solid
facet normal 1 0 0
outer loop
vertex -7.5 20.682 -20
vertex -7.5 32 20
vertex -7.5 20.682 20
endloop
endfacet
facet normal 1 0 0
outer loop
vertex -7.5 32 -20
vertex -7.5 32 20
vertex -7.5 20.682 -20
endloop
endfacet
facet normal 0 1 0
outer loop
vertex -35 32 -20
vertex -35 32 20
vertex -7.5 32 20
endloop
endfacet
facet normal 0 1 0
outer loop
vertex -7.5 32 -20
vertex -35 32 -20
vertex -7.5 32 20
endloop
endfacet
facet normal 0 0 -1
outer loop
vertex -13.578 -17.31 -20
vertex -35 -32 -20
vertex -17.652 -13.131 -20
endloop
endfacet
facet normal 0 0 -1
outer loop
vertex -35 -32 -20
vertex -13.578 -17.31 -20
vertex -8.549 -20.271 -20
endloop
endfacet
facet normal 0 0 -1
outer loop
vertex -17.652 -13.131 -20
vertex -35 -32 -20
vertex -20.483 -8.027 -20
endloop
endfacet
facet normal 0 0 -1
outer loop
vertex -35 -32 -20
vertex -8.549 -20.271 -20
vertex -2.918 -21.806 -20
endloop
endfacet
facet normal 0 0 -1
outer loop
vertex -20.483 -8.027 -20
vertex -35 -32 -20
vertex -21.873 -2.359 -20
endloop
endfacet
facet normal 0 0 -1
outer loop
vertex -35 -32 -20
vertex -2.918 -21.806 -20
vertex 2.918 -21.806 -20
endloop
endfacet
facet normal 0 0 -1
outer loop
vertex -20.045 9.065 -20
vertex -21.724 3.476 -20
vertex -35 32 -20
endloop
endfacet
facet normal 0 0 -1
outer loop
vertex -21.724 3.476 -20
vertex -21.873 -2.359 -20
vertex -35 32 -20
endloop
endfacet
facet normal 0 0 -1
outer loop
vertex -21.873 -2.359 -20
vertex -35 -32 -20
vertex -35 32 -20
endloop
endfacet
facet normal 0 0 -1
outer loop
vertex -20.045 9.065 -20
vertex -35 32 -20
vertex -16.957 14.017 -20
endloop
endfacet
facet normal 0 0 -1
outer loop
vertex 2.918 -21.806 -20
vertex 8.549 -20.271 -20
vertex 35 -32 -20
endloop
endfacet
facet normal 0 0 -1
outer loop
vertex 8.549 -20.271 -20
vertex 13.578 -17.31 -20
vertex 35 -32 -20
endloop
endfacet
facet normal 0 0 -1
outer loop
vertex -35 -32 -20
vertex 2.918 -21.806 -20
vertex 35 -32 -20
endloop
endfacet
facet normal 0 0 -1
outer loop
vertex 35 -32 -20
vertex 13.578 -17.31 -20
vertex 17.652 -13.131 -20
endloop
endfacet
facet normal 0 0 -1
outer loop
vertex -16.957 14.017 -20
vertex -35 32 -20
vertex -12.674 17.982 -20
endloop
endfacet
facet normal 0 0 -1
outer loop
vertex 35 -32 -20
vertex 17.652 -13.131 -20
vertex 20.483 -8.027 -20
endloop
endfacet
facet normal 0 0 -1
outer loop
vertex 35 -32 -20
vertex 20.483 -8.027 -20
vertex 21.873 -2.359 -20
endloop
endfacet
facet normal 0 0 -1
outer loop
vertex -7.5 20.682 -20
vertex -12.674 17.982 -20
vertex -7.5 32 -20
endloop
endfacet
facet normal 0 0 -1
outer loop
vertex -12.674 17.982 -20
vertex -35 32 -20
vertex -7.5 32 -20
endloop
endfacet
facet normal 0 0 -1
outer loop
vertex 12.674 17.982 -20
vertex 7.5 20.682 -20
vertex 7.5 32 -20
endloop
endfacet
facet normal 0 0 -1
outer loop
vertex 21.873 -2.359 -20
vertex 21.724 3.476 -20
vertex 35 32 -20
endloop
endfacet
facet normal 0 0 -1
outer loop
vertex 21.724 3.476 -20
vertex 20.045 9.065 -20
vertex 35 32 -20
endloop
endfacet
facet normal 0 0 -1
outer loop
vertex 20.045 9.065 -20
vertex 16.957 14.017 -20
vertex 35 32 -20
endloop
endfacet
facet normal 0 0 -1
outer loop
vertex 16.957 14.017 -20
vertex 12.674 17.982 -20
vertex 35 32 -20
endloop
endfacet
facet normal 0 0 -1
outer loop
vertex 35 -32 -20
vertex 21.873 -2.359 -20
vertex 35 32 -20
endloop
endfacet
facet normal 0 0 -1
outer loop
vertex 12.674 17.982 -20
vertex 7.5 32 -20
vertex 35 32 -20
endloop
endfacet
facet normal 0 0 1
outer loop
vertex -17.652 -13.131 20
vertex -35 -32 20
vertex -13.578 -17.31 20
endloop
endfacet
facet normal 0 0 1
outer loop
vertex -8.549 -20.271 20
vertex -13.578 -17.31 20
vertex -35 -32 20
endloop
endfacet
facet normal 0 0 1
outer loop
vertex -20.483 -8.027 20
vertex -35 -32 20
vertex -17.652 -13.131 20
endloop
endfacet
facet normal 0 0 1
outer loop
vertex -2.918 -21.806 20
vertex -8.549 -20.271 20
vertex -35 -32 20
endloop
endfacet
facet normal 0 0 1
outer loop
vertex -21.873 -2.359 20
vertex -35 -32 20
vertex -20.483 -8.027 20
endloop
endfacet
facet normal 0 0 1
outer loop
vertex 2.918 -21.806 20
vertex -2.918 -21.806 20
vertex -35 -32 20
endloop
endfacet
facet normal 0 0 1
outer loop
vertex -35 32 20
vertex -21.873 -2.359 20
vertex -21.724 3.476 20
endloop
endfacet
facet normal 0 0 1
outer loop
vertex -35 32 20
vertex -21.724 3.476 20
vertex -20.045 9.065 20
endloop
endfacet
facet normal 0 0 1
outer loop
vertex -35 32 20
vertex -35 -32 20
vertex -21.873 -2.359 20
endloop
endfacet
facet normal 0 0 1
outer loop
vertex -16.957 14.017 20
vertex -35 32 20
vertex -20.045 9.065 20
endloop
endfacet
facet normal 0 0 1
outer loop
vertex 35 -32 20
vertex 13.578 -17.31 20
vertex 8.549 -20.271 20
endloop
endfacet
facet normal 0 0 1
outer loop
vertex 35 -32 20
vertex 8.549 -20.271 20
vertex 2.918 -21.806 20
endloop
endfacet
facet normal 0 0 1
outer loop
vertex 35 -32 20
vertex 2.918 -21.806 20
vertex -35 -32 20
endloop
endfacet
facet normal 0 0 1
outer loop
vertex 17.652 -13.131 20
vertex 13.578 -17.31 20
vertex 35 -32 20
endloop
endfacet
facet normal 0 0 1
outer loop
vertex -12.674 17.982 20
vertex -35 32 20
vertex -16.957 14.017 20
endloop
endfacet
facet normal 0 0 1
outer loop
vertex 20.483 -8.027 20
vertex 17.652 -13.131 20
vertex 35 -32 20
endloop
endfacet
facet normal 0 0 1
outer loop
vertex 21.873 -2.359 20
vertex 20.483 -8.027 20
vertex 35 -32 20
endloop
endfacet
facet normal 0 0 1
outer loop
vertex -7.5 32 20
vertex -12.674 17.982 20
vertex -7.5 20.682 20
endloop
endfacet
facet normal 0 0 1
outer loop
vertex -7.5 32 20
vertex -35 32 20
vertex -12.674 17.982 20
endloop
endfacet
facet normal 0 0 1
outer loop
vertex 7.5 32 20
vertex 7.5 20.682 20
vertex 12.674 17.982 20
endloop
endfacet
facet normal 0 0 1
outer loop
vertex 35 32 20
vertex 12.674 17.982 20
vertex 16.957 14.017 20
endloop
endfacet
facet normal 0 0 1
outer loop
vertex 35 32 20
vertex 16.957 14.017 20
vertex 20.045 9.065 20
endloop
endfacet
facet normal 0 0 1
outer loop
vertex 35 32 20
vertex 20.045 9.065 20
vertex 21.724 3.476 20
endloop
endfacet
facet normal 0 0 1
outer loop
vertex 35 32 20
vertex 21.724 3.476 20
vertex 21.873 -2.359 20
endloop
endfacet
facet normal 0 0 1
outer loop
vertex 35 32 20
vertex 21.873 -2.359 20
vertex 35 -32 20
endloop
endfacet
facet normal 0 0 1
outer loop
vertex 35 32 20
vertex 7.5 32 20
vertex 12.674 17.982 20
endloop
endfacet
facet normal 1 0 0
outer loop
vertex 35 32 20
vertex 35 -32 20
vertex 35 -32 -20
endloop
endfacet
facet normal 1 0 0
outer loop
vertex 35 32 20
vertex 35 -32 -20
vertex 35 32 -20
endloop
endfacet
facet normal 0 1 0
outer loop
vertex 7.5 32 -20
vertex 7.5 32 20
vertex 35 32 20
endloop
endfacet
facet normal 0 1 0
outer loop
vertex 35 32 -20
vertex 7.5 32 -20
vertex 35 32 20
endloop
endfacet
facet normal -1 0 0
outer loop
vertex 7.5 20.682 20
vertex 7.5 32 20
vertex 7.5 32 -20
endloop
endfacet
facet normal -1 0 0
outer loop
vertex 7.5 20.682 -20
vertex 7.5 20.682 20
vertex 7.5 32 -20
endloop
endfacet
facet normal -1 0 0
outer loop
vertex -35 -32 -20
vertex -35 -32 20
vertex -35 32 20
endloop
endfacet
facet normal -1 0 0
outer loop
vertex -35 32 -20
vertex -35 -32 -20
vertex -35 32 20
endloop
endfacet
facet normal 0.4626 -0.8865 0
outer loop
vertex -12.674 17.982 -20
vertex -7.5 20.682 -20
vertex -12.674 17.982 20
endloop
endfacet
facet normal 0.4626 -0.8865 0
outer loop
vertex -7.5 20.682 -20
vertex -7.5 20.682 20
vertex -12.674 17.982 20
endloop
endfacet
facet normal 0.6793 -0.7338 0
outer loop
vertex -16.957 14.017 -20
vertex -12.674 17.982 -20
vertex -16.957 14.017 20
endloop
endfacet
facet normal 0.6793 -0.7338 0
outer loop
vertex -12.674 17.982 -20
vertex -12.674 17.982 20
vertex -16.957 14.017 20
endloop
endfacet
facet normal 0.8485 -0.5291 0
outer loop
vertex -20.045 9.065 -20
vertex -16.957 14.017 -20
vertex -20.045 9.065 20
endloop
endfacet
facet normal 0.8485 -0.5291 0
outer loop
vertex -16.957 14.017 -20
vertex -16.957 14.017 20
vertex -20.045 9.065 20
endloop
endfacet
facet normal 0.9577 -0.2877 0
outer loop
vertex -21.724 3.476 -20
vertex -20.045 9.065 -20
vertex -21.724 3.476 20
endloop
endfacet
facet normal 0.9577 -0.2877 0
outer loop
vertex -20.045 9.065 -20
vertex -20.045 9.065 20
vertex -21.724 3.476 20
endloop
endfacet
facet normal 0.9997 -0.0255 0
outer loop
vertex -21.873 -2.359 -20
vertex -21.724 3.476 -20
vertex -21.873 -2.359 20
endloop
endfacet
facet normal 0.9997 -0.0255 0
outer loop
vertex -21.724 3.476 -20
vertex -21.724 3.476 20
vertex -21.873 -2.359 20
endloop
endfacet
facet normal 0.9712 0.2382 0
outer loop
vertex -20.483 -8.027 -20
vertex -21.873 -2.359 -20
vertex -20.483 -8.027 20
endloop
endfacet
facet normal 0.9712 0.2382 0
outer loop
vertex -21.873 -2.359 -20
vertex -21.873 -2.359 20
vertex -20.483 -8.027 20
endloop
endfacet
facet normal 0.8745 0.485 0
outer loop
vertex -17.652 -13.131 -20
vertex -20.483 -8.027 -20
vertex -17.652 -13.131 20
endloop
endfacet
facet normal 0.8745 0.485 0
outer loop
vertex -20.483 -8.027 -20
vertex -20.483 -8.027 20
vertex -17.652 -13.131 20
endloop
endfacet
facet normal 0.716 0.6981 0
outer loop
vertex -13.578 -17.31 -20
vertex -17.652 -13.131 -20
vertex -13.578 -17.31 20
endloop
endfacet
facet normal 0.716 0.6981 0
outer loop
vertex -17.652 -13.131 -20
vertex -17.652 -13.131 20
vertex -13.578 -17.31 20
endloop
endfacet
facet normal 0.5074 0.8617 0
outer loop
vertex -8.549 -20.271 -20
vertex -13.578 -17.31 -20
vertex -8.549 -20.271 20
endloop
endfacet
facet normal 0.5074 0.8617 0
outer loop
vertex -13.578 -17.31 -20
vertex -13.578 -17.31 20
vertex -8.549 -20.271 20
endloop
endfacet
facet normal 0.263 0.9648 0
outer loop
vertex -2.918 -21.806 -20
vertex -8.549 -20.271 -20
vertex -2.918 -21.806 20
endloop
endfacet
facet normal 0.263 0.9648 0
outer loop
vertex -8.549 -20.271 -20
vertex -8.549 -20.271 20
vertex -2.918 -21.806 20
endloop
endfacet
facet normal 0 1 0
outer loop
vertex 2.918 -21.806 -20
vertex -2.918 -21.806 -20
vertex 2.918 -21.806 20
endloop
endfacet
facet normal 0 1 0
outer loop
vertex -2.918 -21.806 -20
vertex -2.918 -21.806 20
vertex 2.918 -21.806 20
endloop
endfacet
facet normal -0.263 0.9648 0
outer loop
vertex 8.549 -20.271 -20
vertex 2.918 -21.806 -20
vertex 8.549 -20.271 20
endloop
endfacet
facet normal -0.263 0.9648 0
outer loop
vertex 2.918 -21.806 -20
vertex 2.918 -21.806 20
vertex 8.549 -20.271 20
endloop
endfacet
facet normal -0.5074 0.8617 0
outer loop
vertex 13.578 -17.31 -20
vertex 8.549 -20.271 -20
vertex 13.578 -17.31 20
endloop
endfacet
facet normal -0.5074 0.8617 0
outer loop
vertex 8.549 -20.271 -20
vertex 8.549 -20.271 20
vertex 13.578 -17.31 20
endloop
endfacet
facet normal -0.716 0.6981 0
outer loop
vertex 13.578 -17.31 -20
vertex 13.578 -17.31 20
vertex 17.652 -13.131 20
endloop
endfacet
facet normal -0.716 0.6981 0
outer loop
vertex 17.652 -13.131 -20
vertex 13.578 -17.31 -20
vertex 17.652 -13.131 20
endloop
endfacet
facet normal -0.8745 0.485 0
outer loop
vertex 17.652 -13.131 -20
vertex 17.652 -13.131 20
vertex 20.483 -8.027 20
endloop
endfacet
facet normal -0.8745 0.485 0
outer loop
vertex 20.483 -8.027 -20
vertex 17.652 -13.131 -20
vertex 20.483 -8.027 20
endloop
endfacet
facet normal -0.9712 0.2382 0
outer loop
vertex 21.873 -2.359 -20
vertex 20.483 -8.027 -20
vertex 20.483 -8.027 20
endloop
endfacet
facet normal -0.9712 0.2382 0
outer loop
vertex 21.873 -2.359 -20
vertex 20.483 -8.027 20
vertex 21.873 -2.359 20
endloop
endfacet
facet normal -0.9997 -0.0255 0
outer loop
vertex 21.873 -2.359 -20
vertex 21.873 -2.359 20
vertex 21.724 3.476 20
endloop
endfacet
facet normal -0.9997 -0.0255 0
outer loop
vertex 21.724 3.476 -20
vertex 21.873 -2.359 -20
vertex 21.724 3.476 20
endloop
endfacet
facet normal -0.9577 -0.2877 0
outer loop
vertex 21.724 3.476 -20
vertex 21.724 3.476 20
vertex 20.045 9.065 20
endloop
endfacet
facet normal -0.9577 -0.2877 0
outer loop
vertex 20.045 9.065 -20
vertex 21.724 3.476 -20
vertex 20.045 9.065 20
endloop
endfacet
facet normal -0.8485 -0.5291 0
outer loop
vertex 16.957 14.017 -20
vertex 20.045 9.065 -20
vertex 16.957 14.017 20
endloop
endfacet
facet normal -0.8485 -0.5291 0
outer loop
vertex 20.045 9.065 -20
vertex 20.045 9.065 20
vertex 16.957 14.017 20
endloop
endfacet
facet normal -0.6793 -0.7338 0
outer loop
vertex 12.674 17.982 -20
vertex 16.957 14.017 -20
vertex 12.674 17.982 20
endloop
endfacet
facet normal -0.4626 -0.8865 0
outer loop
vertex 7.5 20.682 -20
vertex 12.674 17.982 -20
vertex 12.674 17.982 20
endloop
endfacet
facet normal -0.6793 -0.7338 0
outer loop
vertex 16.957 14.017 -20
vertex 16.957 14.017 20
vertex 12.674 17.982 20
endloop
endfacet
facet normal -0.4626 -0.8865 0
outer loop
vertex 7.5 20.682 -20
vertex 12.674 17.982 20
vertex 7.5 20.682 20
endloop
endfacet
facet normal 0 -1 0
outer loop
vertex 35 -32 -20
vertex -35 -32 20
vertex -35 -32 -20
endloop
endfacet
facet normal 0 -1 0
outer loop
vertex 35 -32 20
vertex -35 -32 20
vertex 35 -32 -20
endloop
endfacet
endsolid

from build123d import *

# Parameters (mm, degrees)
SKETCH_1_W          = 70
SKETCH_1_H          = 64
EXTRUDE_1_DEPTH     = 20
SKETCH_2_R          = 22
CUT_EXTRUDE_1_DEPTH = 40
SKETCH_3_W          = 15
SKETCH_3_H          = 40
CUT_EXTRUDE_2_DEPTH = 20


with BuildPart() as part:
    # 草图1 → 凸台-拉伸1 (new, symmetric)
    with BuildSketch(Plane.XY):
        Rectangle(SKETCH_1_W, SKETCH_1_H)
    extrude(amount=EXTRUDE_1_DEPTH, both=True)

    # 草图2 → 切除-拉伸1 (cut)
    with BuildSketch(Plane.XY.offset(20)):
        Circle(SKETCH_2_R)
    extrude(amount=-CUT_EXTRUDE_1_DEPTH, mode=Mode.SUBTRACT)

    # 草图3 → 切除-拉伸2 (cut)
    with BuildSketch(Plane(origin=(0, 32, 0), x_dir=(1, 0, 0), z_dir=(0, 1, 0))):
        Rectangle(SKETCH_3_W, SKETCH_3_H)
    extrude(amount=-CUT_EXTRUDE_2_DEPTH, mode=Mode.SUBTRACT)


solid = part.part
